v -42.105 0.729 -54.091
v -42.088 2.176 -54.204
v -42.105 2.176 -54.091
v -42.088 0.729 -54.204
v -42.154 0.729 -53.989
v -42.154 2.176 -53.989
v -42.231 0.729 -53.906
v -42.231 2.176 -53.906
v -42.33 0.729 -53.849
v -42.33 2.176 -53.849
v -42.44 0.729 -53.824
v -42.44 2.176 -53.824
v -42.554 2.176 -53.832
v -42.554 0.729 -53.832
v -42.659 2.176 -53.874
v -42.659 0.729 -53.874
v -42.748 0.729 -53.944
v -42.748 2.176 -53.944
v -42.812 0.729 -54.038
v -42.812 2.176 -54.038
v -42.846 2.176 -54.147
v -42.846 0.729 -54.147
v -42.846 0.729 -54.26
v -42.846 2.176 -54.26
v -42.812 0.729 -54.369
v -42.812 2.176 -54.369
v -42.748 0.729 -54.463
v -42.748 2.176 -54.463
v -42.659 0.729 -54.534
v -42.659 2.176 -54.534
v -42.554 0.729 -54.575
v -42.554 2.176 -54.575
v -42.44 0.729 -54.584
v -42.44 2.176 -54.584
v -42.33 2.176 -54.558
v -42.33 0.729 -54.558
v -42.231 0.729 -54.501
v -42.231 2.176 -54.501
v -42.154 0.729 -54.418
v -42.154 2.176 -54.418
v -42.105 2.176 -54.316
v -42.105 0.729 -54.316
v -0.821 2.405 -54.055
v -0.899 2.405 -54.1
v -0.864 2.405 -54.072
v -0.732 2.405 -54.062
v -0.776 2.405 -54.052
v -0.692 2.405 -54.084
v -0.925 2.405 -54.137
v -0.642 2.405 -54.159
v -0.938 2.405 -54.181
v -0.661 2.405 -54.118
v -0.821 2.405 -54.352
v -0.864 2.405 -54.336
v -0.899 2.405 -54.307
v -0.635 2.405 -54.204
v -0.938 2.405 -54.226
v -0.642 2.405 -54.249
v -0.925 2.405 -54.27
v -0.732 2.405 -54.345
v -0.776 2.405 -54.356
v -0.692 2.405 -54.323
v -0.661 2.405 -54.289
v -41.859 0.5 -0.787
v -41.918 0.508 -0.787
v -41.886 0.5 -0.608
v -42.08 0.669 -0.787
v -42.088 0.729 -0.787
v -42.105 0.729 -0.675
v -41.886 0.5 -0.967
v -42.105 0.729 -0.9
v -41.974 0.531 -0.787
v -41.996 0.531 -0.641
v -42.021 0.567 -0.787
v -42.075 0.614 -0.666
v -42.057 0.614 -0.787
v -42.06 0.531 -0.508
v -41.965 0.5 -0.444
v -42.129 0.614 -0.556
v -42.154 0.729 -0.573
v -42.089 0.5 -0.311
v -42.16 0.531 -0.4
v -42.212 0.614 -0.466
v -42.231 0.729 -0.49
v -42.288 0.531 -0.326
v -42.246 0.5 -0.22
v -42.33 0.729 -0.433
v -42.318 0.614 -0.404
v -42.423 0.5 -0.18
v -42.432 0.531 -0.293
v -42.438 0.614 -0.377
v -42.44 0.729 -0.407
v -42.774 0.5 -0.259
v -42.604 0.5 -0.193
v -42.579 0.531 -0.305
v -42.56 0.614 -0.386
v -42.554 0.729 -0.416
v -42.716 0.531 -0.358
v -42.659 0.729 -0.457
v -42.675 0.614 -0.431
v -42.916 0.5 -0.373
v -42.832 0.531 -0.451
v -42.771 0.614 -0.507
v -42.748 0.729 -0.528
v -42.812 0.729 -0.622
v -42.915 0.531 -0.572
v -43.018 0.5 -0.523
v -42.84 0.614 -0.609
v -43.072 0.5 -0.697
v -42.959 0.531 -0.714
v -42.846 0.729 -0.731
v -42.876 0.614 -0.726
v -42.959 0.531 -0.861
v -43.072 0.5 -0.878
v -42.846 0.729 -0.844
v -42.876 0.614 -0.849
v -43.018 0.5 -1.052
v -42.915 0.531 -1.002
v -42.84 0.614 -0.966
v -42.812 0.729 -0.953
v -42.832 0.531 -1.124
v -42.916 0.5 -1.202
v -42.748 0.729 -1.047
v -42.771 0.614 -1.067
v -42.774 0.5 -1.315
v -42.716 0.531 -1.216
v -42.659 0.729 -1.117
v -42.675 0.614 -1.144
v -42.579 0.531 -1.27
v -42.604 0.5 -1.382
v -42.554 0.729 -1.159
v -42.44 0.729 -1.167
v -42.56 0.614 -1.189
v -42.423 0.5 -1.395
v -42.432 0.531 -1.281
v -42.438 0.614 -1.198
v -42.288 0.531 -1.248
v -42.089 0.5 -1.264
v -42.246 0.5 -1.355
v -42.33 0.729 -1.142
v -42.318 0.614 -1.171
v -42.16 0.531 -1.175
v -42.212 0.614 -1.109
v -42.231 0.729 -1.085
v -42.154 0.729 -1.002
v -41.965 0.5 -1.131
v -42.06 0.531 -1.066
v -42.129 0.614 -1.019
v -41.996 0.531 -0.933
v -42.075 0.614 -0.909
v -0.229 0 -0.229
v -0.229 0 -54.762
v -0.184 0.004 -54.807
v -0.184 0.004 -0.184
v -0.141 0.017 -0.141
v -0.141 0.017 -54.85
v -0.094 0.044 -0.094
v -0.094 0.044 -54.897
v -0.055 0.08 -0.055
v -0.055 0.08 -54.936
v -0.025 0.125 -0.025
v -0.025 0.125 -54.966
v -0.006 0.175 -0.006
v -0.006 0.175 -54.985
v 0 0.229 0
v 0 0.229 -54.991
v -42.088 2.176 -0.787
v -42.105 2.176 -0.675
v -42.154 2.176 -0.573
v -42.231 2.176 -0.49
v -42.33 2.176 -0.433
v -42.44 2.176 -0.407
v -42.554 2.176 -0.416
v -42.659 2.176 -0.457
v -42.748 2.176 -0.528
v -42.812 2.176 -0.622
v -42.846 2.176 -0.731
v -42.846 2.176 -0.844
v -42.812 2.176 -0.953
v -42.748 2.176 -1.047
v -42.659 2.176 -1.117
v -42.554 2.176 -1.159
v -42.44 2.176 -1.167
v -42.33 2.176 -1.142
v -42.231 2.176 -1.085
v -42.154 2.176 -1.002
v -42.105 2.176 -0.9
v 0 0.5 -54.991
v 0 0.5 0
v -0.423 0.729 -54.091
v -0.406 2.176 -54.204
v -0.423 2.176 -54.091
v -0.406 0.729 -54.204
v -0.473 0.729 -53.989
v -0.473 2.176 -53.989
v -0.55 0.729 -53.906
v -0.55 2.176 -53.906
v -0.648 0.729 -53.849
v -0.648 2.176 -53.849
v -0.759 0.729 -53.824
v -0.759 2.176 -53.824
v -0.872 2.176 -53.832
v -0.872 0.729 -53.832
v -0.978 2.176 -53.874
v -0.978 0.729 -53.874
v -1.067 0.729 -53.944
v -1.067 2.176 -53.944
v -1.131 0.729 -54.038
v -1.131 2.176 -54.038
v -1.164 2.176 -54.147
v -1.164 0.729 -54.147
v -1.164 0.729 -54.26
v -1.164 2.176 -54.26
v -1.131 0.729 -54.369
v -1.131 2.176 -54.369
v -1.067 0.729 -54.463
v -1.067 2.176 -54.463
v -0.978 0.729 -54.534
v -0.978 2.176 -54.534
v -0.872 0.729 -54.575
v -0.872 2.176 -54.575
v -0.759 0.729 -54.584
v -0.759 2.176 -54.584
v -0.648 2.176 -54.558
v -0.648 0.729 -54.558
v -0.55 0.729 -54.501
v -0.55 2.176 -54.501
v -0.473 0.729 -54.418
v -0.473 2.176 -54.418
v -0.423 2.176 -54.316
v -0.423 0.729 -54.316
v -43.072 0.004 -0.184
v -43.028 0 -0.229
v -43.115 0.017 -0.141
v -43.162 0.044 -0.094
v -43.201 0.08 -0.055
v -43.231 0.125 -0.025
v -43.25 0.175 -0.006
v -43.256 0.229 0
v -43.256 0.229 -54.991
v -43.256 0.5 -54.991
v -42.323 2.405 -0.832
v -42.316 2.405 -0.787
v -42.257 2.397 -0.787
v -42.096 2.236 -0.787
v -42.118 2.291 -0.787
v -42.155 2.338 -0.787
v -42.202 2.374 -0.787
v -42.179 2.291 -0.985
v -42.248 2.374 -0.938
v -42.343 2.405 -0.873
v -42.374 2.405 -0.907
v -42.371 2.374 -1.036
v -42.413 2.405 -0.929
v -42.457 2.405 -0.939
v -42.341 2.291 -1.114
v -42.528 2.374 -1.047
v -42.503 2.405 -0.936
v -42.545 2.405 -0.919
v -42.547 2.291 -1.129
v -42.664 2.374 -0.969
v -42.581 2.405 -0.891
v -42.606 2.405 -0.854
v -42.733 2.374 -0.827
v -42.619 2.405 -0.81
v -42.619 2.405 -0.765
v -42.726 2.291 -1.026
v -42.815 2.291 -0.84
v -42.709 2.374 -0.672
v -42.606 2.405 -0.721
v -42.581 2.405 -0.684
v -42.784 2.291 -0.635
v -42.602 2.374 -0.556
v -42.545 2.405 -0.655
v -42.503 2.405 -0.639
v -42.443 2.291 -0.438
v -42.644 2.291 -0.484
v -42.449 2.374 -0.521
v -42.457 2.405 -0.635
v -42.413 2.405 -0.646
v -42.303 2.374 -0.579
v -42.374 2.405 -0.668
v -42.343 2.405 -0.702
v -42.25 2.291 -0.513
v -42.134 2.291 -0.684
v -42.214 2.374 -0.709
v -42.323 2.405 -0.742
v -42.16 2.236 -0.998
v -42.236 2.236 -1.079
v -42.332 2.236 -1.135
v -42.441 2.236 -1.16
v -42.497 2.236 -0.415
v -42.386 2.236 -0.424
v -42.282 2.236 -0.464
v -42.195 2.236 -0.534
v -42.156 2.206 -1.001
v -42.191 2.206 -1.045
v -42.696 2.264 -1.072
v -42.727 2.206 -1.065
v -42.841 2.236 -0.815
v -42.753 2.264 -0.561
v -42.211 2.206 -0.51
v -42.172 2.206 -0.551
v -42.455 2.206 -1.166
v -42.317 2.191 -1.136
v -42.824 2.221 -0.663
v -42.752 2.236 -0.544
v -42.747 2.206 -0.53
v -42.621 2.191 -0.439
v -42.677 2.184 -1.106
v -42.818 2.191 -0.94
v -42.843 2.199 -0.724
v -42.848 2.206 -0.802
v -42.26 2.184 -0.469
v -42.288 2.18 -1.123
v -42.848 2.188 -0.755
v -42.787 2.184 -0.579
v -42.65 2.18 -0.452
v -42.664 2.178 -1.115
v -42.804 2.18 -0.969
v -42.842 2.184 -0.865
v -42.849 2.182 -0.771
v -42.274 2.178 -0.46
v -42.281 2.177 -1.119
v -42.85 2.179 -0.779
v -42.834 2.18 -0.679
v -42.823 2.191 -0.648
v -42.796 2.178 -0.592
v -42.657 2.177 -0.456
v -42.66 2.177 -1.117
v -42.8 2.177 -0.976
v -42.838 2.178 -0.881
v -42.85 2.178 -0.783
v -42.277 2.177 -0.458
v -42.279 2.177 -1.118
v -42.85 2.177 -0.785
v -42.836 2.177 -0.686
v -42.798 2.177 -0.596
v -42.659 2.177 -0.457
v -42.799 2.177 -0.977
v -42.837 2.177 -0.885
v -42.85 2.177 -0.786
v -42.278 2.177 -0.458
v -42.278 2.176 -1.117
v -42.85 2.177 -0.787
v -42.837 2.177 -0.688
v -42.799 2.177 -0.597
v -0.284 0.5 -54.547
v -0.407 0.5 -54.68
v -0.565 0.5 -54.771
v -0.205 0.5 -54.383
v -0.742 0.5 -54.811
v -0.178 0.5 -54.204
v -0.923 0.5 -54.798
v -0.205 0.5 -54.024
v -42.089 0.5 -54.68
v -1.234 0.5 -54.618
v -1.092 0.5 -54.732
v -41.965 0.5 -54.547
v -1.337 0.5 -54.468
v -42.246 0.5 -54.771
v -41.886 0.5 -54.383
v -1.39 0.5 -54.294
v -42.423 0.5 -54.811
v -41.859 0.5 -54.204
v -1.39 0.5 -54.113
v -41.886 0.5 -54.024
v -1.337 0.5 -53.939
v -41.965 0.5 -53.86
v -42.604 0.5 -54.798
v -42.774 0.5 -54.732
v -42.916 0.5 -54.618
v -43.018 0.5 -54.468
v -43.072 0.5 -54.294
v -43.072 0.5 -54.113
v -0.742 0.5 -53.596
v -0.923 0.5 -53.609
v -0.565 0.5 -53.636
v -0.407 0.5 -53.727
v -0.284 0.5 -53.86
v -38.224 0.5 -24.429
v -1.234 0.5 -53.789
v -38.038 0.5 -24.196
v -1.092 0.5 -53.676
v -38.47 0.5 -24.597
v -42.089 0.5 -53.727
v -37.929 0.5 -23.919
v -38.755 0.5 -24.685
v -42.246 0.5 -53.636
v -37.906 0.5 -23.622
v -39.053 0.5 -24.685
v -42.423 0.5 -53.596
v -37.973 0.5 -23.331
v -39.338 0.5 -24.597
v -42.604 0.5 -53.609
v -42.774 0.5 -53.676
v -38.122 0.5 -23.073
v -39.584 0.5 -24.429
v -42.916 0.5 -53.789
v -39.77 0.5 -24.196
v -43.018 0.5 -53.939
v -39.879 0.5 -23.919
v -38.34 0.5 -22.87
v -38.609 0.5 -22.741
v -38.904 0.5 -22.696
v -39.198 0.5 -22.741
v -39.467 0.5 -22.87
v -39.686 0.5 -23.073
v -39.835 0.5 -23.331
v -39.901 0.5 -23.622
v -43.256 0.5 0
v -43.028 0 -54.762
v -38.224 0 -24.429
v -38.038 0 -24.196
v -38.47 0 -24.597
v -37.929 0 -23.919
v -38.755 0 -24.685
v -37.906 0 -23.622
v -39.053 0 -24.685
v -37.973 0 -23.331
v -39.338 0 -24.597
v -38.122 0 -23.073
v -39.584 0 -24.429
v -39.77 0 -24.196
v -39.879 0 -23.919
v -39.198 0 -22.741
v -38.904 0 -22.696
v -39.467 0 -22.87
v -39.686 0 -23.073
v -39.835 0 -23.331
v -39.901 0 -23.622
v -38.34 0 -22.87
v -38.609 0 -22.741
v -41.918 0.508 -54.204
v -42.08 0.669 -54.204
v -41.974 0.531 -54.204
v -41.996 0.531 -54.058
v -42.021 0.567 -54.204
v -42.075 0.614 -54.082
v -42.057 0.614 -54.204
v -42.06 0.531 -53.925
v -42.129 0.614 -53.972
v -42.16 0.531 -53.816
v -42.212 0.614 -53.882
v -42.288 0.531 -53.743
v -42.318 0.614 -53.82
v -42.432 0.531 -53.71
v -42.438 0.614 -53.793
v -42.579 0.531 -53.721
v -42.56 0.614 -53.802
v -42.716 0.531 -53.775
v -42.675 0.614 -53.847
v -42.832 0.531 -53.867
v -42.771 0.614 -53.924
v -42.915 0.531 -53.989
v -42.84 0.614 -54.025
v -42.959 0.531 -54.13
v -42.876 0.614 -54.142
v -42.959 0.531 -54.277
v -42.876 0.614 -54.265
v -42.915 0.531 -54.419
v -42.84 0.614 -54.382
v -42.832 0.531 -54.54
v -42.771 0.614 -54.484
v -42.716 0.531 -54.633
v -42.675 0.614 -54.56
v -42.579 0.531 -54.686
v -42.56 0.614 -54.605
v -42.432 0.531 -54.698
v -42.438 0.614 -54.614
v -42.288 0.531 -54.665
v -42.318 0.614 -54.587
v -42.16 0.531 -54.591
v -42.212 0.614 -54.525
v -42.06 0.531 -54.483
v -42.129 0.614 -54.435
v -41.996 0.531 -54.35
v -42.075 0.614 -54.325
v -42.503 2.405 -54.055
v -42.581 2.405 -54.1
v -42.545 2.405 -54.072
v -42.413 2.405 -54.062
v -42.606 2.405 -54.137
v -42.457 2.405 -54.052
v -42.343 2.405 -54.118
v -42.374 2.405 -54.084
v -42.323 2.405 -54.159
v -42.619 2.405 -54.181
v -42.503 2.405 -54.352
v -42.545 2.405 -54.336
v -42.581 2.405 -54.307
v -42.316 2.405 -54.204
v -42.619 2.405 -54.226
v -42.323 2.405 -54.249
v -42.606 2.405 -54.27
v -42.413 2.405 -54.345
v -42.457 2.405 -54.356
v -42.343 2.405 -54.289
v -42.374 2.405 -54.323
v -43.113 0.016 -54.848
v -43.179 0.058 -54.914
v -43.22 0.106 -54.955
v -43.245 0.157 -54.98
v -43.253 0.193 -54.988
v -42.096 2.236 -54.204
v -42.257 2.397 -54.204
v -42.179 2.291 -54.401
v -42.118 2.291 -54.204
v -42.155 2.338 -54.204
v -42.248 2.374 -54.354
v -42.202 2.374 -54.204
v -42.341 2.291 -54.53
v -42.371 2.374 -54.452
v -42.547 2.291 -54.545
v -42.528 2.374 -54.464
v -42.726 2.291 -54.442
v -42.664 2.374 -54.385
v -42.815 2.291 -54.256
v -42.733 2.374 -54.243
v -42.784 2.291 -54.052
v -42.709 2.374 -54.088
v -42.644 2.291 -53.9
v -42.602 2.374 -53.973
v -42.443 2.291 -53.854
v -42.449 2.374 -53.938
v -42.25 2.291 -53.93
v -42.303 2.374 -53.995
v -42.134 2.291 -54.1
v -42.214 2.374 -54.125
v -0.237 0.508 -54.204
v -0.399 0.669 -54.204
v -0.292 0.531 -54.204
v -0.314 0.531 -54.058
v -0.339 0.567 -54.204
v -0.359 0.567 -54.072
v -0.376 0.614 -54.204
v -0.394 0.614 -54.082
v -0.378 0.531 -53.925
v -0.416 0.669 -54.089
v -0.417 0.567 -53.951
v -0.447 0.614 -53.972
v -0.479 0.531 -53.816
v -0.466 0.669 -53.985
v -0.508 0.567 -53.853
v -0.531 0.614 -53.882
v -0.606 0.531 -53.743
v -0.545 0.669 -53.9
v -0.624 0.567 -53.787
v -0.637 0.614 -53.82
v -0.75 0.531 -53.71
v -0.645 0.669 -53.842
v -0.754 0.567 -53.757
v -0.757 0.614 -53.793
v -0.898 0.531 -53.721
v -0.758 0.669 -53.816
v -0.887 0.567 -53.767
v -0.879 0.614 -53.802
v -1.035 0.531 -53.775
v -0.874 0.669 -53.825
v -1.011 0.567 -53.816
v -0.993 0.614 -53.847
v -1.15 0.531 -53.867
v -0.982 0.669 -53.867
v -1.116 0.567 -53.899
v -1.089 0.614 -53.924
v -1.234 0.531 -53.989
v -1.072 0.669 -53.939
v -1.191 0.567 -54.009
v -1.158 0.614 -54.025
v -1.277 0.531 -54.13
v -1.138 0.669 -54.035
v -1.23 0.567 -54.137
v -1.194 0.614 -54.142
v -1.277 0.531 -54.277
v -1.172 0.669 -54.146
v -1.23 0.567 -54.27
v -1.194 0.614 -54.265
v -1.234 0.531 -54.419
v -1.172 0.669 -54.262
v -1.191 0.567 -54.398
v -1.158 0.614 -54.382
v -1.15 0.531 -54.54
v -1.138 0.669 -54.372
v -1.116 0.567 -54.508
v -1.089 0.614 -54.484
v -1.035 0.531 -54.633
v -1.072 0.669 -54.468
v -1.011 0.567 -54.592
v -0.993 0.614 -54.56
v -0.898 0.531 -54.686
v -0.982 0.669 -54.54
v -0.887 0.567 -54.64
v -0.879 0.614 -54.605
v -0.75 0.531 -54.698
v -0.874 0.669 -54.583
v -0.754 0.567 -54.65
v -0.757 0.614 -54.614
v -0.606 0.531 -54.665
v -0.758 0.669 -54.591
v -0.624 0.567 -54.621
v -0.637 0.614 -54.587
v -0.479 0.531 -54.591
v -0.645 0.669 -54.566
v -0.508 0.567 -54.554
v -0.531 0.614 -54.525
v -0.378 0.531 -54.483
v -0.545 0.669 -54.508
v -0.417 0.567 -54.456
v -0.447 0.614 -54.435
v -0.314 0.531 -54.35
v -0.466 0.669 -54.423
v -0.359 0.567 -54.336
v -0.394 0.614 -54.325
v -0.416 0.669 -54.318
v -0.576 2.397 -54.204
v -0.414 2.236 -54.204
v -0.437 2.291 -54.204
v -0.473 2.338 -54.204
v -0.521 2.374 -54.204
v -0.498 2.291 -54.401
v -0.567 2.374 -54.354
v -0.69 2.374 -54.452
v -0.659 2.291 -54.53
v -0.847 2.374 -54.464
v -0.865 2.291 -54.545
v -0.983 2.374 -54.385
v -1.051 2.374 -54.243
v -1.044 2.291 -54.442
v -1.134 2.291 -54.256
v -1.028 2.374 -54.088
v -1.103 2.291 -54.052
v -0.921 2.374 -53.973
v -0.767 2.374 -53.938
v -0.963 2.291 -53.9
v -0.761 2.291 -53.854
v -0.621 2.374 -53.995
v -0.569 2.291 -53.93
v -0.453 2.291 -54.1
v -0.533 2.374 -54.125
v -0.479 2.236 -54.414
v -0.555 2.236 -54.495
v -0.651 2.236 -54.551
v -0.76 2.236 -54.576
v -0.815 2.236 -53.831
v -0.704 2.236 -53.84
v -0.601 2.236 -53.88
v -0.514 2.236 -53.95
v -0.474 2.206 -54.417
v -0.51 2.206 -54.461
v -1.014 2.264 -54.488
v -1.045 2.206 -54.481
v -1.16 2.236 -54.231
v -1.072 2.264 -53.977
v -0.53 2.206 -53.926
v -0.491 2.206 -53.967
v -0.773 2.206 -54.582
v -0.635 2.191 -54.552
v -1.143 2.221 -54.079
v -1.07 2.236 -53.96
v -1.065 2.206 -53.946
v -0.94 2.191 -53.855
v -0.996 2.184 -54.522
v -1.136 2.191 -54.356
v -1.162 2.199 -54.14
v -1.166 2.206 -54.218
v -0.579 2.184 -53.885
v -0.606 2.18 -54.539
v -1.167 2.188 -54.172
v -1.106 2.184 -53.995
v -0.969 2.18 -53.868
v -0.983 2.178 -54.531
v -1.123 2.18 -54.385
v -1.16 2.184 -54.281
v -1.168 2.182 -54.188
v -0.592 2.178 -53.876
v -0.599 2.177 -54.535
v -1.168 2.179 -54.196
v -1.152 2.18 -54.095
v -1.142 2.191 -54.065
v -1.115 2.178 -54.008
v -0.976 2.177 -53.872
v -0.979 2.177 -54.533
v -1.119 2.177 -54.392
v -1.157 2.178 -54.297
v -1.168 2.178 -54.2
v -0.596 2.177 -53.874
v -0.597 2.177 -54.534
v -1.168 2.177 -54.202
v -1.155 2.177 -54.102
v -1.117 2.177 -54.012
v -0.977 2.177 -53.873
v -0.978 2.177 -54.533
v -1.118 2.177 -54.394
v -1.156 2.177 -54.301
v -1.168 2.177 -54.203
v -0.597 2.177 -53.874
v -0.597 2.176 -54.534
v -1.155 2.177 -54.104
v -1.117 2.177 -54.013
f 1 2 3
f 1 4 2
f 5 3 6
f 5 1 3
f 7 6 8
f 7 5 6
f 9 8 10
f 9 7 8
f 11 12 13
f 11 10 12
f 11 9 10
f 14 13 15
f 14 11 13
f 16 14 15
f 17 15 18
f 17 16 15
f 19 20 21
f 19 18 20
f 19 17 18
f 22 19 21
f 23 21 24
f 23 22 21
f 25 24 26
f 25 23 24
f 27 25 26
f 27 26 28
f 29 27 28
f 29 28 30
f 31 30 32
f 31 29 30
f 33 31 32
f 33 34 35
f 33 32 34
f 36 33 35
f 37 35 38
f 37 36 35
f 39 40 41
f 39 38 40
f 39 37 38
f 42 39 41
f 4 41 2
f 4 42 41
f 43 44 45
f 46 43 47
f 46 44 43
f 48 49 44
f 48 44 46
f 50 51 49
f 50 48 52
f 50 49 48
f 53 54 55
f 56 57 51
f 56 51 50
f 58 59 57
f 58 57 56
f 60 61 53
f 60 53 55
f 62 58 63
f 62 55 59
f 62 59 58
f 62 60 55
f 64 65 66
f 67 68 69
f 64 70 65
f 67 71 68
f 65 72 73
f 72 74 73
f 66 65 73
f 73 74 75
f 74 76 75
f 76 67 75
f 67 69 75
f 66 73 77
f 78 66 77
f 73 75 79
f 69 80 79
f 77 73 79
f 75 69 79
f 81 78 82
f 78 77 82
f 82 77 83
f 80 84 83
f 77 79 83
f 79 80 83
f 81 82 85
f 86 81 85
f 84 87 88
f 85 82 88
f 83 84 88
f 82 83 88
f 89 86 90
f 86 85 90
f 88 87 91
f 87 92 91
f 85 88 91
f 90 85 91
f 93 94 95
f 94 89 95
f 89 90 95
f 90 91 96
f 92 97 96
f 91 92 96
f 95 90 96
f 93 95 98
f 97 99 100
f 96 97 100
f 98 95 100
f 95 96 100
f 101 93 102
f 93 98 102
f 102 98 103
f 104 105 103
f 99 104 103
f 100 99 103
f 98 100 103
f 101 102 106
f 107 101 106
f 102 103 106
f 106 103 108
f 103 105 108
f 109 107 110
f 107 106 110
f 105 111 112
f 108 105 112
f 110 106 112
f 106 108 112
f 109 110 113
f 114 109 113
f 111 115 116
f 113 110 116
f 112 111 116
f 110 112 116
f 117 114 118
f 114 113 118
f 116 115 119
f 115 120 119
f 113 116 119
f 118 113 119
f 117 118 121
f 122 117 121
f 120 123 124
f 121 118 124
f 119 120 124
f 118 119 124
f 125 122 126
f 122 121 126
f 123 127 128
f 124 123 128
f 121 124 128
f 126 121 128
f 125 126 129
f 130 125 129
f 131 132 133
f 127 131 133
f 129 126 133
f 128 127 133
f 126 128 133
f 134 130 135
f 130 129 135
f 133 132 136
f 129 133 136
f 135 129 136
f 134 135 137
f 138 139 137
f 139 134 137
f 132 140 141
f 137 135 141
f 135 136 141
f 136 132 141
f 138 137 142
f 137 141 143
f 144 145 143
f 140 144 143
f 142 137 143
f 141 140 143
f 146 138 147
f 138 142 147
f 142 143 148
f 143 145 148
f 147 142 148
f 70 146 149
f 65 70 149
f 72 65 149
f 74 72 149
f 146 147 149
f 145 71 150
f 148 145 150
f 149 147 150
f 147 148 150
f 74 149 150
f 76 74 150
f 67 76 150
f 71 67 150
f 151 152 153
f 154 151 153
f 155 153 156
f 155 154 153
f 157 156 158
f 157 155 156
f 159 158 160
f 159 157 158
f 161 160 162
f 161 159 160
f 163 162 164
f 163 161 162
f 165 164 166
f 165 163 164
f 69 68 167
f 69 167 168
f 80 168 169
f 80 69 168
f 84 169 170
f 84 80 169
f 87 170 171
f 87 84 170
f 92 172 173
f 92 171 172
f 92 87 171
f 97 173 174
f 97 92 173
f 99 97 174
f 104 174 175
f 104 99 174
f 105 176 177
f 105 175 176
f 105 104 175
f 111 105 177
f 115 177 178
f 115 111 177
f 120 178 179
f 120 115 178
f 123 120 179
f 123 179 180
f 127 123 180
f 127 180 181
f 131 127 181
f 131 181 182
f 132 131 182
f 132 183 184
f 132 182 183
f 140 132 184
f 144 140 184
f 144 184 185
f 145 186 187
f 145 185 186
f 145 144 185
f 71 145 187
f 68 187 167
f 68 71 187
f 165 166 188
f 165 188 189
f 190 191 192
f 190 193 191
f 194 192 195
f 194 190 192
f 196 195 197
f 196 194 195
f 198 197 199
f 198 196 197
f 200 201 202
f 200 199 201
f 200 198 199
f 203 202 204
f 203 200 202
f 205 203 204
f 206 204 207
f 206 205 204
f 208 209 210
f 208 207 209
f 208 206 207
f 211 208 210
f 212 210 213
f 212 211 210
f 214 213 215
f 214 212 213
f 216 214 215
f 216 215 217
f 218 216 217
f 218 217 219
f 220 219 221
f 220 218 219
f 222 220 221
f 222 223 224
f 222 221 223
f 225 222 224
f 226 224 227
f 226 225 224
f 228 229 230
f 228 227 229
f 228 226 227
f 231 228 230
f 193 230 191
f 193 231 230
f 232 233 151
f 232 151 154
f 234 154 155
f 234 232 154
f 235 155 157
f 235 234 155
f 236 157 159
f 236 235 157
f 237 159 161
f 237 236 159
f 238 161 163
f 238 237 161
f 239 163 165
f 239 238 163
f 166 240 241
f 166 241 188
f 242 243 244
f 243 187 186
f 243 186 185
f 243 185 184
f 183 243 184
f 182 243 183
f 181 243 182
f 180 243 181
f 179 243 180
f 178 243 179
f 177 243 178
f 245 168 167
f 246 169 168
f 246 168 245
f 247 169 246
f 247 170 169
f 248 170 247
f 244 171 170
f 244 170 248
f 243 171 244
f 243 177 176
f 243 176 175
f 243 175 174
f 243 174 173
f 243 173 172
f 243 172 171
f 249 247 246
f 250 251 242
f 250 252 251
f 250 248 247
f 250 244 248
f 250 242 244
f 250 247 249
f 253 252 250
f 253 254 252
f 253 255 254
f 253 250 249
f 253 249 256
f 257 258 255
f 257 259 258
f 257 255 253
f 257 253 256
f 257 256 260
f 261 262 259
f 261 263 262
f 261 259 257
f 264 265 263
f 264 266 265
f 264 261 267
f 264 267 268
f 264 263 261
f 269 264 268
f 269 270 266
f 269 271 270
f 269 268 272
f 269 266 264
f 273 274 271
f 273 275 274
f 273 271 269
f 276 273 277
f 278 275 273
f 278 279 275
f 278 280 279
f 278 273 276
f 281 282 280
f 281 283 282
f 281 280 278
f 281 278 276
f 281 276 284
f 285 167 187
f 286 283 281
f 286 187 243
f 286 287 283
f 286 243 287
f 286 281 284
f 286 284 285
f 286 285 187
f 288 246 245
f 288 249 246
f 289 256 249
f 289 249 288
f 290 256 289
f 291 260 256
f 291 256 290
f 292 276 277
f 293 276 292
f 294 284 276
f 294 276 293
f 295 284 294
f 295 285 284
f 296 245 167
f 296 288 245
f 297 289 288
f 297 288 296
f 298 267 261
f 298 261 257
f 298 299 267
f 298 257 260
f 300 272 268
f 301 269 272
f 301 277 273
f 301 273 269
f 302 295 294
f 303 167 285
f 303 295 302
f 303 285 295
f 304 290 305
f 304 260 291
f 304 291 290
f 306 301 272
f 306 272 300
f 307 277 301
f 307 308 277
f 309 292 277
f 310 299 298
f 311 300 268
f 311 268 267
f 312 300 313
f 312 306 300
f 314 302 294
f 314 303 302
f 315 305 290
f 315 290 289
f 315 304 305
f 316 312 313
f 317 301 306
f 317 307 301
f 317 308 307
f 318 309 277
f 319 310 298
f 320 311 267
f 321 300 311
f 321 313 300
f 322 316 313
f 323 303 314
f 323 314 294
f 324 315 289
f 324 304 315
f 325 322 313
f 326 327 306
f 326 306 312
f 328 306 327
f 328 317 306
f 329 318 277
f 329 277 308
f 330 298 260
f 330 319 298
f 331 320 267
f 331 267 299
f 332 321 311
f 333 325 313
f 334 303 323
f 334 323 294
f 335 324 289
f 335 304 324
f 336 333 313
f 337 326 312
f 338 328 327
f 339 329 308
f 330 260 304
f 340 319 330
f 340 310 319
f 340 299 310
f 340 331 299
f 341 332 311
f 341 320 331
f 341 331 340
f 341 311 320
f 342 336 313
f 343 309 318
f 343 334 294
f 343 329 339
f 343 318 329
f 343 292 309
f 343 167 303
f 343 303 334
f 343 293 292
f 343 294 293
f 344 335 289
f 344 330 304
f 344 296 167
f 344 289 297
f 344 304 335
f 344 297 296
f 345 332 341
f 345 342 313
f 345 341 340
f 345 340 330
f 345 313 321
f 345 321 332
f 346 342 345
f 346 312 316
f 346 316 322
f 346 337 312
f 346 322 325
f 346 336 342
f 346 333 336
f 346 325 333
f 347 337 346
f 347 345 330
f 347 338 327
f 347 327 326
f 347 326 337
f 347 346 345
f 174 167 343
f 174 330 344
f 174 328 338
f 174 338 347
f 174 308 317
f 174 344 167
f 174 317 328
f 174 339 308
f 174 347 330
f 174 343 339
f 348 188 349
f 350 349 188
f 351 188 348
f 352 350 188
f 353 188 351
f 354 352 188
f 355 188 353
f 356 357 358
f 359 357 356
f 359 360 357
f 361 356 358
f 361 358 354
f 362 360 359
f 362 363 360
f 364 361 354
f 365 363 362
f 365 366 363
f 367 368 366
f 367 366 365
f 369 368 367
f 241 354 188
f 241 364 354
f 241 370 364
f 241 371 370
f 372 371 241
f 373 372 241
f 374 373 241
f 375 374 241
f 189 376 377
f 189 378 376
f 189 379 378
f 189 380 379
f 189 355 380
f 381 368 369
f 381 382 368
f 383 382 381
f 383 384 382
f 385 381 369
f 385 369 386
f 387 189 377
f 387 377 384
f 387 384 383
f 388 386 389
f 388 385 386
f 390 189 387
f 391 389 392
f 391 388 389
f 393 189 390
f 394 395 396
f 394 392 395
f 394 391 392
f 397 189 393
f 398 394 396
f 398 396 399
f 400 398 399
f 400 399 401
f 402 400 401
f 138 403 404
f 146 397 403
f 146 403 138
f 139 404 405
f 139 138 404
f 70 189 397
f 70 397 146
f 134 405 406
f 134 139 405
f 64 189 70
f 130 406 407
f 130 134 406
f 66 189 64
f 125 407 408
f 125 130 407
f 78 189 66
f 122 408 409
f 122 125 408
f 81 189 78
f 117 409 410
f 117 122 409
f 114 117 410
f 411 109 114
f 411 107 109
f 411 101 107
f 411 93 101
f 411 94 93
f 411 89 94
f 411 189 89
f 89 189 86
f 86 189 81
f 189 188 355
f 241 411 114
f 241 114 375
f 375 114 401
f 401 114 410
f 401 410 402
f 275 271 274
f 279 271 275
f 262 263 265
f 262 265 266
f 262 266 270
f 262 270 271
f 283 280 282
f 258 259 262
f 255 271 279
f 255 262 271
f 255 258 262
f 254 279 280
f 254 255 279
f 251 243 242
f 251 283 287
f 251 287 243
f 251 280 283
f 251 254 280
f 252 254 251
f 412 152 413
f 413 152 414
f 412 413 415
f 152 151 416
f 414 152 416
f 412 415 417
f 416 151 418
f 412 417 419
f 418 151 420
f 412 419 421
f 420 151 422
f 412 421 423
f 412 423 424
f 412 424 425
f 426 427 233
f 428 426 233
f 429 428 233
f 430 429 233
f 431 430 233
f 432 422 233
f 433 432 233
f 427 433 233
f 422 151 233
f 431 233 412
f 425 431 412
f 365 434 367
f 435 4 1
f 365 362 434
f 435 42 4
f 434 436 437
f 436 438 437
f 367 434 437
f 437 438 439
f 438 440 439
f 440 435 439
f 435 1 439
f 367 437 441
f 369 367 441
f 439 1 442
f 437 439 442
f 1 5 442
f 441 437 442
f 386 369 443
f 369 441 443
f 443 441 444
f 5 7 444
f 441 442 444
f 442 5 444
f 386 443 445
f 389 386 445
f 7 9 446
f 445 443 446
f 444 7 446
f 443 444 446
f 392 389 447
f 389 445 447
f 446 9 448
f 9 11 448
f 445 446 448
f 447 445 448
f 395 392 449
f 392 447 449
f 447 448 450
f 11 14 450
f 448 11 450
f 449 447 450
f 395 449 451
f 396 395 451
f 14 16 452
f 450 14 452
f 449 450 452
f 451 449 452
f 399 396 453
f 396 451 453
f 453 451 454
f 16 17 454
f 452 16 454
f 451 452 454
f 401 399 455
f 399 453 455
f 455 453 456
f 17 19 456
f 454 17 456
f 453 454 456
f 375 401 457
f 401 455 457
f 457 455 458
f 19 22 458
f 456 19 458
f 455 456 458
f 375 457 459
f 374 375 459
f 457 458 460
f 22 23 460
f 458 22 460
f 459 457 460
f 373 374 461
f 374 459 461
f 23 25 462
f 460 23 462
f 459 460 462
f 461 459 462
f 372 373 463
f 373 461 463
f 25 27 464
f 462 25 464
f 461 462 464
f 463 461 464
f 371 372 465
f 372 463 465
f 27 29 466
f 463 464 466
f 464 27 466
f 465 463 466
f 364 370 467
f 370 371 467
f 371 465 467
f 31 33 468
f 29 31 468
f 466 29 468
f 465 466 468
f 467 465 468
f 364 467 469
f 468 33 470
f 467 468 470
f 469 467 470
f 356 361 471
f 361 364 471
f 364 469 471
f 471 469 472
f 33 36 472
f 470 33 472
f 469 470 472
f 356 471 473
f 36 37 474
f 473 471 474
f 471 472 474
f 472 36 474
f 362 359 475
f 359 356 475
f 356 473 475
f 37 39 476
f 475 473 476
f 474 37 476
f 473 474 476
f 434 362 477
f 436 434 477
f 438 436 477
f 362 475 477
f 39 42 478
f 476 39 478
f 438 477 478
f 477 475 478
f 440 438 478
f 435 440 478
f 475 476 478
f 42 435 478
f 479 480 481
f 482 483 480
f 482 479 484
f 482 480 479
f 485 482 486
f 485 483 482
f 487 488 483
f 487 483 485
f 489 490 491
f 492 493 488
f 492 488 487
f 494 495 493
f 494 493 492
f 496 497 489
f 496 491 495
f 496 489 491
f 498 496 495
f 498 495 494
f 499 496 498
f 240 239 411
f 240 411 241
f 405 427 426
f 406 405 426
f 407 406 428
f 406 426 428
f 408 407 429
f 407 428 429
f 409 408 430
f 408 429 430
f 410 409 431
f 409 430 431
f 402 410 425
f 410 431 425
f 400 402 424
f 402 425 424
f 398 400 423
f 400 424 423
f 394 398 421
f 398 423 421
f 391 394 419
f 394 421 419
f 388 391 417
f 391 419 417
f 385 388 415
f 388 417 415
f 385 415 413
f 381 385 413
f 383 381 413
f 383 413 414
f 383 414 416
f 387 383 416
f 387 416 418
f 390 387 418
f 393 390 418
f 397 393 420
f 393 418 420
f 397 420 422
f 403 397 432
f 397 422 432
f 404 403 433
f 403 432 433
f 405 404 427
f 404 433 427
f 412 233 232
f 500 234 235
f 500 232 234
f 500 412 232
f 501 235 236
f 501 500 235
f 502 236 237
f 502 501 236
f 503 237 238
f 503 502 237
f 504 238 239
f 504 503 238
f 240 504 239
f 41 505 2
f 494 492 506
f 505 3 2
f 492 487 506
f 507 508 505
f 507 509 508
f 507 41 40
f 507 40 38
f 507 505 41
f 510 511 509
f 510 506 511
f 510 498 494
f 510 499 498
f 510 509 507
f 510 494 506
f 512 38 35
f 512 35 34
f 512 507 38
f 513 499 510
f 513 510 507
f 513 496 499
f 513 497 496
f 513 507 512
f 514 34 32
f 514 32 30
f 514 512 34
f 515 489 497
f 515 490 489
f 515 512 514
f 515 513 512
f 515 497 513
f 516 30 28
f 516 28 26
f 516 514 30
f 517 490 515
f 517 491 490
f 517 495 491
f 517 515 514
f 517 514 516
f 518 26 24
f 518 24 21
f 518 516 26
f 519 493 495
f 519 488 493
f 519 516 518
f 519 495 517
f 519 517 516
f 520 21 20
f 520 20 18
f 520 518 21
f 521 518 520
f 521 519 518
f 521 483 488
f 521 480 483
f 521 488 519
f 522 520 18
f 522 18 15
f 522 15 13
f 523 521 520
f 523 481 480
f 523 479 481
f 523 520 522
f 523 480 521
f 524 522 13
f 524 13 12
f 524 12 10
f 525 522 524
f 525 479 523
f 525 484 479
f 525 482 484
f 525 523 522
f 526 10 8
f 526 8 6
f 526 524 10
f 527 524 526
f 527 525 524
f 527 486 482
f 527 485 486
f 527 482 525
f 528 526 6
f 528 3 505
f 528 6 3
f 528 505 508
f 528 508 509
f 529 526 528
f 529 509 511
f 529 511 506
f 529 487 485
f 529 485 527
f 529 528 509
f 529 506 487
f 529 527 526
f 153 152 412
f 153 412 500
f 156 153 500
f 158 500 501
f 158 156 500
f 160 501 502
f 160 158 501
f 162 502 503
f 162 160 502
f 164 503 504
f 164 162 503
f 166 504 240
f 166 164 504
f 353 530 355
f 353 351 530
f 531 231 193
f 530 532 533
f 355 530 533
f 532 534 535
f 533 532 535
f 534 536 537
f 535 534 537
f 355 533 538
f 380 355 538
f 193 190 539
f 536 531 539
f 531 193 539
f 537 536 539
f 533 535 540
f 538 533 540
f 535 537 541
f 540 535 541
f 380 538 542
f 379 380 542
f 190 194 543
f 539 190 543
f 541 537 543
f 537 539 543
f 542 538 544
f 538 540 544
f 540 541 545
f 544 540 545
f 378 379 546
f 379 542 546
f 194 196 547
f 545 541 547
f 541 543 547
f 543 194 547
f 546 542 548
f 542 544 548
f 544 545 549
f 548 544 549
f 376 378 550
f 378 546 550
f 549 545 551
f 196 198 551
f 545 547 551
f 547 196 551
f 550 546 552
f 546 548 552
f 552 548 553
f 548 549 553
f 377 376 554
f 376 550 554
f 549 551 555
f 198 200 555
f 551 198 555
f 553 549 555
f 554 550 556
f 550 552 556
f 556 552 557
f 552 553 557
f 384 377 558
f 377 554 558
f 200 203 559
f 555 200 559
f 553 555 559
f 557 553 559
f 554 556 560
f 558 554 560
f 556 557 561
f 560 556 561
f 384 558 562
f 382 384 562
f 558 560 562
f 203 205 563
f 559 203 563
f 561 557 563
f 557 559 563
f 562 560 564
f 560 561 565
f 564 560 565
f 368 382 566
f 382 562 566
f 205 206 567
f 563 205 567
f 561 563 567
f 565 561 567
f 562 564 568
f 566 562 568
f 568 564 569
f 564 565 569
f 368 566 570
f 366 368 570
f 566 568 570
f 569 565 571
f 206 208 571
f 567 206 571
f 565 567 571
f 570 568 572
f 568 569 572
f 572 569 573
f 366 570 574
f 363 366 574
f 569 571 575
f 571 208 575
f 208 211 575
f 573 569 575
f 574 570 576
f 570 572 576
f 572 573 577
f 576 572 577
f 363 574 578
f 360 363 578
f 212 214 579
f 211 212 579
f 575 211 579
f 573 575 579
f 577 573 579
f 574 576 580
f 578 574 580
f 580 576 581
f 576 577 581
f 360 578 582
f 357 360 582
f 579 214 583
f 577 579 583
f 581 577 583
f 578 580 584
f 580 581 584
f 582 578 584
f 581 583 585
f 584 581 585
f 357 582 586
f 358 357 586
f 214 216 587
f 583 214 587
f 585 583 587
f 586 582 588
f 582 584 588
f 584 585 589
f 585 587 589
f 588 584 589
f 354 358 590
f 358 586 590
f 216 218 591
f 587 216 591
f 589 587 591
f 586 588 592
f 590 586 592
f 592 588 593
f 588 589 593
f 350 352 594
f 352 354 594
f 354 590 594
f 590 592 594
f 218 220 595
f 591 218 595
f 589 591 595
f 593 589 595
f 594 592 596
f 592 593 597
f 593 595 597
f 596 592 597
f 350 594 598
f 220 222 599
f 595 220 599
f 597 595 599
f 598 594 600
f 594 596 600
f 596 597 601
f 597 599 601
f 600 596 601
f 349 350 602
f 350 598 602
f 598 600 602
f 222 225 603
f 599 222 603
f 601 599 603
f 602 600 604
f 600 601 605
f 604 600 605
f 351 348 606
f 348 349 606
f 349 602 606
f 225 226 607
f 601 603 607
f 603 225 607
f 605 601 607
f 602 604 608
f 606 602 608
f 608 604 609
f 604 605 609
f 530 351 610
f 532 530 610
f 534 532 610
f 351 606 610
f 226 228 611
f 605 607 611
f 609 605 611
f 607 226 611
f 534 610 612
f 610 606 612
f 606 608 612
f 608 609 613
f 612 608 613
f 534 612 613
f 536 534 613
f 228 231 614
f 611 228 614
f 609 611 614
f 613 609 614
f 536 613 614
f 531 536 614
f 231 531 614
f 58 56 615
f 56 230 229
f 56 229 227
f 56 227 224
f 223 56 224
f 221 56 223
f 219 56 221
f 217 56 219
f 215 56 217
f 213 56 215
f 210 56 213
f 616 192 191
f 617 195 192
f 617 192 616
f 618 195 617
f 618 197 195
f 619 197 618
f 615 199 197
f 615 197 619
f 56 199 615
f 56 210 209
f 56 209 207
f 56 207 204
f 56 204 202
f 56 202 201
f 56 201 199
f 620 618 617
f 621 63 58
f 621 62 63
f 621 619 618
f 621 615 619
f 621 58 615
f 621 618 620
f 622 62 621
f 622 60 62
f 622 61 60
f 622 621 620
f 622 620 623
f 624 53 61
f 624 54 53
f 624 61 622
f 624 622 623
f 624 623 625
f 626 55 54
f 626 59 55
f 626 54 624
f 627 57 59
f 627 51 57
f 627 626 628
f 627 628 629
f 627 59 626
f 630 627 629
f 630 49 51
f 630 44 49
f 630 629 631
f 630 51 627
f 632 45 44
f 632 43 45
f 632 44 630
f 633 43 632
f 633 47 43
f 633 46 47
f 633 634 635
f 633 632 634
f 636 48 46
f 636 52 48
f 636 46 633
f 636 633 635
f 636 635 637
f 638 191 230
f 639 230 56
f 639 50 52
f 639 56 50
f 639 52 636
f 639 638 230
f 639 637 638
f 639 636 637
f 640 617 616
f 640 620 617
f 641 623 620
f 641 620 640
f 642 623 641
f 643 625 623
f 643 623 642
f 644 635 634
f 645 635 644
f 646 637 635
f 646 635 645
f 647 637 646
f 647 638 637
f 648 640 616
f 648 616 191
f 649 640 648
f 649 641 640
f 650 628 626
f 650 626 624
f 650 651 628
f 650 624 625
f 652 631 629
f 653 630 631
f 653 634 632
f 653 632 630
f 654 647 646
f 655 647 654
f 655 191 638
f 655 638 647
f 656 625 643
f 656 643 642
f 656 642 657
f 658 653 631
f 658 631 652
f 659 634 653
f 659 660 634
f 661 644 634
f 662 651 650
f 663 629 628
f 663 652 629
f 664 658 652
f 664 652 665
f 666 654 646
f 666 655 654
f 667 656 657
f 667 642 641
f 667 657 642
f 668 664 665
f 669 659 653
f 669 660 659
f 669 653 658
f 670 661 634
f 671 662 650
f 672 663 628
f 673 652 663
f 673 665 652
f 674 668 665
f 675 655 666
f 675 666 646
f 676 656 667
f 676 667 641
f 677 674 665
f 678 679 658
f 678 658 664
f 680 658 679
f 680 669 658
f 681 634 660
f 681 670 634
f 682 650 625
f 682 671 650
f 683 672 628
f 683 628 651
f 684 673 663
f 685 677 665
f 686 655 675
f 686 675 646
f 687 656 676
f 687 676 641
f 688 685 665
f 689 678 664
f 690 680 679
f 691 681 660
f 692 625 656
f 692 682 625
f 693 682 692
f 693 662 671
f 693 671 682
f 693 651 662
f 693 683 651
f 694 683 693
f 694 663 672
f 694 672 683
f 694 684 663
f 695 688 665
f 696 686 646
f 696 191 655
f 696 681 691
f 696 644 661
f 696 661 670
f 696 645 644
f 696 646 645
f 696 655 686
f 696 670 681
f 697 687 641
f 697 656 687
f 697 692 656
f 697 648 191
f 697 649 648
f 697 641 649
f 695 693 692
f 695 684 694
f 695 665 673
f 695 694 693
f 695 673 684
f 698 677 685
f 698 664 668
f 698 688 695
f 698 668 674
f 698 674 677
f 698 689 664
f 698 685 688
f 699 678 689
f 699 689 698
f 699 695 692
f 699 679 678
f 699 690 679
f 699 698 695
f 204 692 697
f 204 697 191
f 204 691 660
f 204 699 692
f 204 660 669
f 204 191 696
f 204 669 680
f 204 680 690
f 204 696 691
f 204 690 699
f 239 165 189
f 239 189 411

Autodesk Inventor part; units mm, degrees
ref_plane "YZ Plane" through (0, 0, 0) normal (1, 0, 0) x (0, 1, 0)
ref_plane "XZ Plane" through (0, 0, 0) normal (0, 1, 0) x (-1, 0, 0)
ref_plane "XY Plane" through (0, 0, 0) normal (0, 0, 1) x (1, 0, 0)
sketch "Sketch1" plane through (0, 0, 0) normal (0, 1, 0) x (-1, 0, 0)
  line L0 (0, 0) -> (43.2562, 0)
  line L1 (43.2562, 0) -> (43.2562, -54.991)
  line L2 (43.2562, -54.991) -> (0, -54.991)
  line L3 (0, -54.991) -> (0, 0)
  dimension "d0" = 43.2562
  dimension "d1" = 54.991
extrude "Extrusion1" add sketch "Sketch1" along normal blind 0.5
sketch "Sketch2" plane through (0, 0.5, 0) normal (0, 1, 0) x (1, 0, 0)
  circle A0 centre (-42.4688, 0.7874) radius 0.381
  circle A1 centre (-42.4688, 54.2036) radius 0.381
  circle A2 centre (-0.7874, 54.2036) radius 0.381
  circle A3 centre (-0.7874, 0.7874) radius 0.381
  point P0 (0, 0)
  dimension "d4" = 0.762
  dimension "d5" = 0.762
  dimension "d6" = 0.762
  dimension "d10" = 0.762
extrude "Extrusion2" add sketch "Sketch2" along normal blind 1.905 contours A0 | A1 | A2
fillet "Fillet1" radius 0.2286 10 edges at (-42.8498, 2.405, -0.7874) (-42.8498, 2.405, -54.2036) (-1.1684, 2.405, -54.2036) (-1.1684, 0.5, -54.2036) (-42.8498, 0.5, -54.2036) (-42.8498, 0.5, -0.7874) (-21.6281, 0, 0) (0, 0, -27.4955) (-21.6281, 0, -54.991) (-43.2562, 0, -27.4955)
sketch "Sketch3" plane through (0, 0.5, 0) normal (0, 1, 0) x (1, 0, 0)
  line L0 (0, 54.991) -> (-43.2562, 54.991) projected
  line L1 (0, 54.991) -> (0, 25.019)
  line L2 (0, 54.991) -> (0, 0) projected
  line L3 (0, 25.019) -> (-2.8956, 25.019)
  line L4 (-43.2562, 25.019) -> (-40.3606, 25.019)
  line L5 (-40.3606, 25.019) -> (-39.3606, 25.019)
  point P0 (-38.9037, 23.6963)
  dimension "d11" = 29.972
  dimension "d12" = 2.8956
  dimension "d20" = 2.8956
  dimension "d21" = 1
hole "Hole1" at (-38.9037, 0.5, -23.6963) direction (0, -1, 0) diameter 2 end through all
properties part number "enclosure_lid"
